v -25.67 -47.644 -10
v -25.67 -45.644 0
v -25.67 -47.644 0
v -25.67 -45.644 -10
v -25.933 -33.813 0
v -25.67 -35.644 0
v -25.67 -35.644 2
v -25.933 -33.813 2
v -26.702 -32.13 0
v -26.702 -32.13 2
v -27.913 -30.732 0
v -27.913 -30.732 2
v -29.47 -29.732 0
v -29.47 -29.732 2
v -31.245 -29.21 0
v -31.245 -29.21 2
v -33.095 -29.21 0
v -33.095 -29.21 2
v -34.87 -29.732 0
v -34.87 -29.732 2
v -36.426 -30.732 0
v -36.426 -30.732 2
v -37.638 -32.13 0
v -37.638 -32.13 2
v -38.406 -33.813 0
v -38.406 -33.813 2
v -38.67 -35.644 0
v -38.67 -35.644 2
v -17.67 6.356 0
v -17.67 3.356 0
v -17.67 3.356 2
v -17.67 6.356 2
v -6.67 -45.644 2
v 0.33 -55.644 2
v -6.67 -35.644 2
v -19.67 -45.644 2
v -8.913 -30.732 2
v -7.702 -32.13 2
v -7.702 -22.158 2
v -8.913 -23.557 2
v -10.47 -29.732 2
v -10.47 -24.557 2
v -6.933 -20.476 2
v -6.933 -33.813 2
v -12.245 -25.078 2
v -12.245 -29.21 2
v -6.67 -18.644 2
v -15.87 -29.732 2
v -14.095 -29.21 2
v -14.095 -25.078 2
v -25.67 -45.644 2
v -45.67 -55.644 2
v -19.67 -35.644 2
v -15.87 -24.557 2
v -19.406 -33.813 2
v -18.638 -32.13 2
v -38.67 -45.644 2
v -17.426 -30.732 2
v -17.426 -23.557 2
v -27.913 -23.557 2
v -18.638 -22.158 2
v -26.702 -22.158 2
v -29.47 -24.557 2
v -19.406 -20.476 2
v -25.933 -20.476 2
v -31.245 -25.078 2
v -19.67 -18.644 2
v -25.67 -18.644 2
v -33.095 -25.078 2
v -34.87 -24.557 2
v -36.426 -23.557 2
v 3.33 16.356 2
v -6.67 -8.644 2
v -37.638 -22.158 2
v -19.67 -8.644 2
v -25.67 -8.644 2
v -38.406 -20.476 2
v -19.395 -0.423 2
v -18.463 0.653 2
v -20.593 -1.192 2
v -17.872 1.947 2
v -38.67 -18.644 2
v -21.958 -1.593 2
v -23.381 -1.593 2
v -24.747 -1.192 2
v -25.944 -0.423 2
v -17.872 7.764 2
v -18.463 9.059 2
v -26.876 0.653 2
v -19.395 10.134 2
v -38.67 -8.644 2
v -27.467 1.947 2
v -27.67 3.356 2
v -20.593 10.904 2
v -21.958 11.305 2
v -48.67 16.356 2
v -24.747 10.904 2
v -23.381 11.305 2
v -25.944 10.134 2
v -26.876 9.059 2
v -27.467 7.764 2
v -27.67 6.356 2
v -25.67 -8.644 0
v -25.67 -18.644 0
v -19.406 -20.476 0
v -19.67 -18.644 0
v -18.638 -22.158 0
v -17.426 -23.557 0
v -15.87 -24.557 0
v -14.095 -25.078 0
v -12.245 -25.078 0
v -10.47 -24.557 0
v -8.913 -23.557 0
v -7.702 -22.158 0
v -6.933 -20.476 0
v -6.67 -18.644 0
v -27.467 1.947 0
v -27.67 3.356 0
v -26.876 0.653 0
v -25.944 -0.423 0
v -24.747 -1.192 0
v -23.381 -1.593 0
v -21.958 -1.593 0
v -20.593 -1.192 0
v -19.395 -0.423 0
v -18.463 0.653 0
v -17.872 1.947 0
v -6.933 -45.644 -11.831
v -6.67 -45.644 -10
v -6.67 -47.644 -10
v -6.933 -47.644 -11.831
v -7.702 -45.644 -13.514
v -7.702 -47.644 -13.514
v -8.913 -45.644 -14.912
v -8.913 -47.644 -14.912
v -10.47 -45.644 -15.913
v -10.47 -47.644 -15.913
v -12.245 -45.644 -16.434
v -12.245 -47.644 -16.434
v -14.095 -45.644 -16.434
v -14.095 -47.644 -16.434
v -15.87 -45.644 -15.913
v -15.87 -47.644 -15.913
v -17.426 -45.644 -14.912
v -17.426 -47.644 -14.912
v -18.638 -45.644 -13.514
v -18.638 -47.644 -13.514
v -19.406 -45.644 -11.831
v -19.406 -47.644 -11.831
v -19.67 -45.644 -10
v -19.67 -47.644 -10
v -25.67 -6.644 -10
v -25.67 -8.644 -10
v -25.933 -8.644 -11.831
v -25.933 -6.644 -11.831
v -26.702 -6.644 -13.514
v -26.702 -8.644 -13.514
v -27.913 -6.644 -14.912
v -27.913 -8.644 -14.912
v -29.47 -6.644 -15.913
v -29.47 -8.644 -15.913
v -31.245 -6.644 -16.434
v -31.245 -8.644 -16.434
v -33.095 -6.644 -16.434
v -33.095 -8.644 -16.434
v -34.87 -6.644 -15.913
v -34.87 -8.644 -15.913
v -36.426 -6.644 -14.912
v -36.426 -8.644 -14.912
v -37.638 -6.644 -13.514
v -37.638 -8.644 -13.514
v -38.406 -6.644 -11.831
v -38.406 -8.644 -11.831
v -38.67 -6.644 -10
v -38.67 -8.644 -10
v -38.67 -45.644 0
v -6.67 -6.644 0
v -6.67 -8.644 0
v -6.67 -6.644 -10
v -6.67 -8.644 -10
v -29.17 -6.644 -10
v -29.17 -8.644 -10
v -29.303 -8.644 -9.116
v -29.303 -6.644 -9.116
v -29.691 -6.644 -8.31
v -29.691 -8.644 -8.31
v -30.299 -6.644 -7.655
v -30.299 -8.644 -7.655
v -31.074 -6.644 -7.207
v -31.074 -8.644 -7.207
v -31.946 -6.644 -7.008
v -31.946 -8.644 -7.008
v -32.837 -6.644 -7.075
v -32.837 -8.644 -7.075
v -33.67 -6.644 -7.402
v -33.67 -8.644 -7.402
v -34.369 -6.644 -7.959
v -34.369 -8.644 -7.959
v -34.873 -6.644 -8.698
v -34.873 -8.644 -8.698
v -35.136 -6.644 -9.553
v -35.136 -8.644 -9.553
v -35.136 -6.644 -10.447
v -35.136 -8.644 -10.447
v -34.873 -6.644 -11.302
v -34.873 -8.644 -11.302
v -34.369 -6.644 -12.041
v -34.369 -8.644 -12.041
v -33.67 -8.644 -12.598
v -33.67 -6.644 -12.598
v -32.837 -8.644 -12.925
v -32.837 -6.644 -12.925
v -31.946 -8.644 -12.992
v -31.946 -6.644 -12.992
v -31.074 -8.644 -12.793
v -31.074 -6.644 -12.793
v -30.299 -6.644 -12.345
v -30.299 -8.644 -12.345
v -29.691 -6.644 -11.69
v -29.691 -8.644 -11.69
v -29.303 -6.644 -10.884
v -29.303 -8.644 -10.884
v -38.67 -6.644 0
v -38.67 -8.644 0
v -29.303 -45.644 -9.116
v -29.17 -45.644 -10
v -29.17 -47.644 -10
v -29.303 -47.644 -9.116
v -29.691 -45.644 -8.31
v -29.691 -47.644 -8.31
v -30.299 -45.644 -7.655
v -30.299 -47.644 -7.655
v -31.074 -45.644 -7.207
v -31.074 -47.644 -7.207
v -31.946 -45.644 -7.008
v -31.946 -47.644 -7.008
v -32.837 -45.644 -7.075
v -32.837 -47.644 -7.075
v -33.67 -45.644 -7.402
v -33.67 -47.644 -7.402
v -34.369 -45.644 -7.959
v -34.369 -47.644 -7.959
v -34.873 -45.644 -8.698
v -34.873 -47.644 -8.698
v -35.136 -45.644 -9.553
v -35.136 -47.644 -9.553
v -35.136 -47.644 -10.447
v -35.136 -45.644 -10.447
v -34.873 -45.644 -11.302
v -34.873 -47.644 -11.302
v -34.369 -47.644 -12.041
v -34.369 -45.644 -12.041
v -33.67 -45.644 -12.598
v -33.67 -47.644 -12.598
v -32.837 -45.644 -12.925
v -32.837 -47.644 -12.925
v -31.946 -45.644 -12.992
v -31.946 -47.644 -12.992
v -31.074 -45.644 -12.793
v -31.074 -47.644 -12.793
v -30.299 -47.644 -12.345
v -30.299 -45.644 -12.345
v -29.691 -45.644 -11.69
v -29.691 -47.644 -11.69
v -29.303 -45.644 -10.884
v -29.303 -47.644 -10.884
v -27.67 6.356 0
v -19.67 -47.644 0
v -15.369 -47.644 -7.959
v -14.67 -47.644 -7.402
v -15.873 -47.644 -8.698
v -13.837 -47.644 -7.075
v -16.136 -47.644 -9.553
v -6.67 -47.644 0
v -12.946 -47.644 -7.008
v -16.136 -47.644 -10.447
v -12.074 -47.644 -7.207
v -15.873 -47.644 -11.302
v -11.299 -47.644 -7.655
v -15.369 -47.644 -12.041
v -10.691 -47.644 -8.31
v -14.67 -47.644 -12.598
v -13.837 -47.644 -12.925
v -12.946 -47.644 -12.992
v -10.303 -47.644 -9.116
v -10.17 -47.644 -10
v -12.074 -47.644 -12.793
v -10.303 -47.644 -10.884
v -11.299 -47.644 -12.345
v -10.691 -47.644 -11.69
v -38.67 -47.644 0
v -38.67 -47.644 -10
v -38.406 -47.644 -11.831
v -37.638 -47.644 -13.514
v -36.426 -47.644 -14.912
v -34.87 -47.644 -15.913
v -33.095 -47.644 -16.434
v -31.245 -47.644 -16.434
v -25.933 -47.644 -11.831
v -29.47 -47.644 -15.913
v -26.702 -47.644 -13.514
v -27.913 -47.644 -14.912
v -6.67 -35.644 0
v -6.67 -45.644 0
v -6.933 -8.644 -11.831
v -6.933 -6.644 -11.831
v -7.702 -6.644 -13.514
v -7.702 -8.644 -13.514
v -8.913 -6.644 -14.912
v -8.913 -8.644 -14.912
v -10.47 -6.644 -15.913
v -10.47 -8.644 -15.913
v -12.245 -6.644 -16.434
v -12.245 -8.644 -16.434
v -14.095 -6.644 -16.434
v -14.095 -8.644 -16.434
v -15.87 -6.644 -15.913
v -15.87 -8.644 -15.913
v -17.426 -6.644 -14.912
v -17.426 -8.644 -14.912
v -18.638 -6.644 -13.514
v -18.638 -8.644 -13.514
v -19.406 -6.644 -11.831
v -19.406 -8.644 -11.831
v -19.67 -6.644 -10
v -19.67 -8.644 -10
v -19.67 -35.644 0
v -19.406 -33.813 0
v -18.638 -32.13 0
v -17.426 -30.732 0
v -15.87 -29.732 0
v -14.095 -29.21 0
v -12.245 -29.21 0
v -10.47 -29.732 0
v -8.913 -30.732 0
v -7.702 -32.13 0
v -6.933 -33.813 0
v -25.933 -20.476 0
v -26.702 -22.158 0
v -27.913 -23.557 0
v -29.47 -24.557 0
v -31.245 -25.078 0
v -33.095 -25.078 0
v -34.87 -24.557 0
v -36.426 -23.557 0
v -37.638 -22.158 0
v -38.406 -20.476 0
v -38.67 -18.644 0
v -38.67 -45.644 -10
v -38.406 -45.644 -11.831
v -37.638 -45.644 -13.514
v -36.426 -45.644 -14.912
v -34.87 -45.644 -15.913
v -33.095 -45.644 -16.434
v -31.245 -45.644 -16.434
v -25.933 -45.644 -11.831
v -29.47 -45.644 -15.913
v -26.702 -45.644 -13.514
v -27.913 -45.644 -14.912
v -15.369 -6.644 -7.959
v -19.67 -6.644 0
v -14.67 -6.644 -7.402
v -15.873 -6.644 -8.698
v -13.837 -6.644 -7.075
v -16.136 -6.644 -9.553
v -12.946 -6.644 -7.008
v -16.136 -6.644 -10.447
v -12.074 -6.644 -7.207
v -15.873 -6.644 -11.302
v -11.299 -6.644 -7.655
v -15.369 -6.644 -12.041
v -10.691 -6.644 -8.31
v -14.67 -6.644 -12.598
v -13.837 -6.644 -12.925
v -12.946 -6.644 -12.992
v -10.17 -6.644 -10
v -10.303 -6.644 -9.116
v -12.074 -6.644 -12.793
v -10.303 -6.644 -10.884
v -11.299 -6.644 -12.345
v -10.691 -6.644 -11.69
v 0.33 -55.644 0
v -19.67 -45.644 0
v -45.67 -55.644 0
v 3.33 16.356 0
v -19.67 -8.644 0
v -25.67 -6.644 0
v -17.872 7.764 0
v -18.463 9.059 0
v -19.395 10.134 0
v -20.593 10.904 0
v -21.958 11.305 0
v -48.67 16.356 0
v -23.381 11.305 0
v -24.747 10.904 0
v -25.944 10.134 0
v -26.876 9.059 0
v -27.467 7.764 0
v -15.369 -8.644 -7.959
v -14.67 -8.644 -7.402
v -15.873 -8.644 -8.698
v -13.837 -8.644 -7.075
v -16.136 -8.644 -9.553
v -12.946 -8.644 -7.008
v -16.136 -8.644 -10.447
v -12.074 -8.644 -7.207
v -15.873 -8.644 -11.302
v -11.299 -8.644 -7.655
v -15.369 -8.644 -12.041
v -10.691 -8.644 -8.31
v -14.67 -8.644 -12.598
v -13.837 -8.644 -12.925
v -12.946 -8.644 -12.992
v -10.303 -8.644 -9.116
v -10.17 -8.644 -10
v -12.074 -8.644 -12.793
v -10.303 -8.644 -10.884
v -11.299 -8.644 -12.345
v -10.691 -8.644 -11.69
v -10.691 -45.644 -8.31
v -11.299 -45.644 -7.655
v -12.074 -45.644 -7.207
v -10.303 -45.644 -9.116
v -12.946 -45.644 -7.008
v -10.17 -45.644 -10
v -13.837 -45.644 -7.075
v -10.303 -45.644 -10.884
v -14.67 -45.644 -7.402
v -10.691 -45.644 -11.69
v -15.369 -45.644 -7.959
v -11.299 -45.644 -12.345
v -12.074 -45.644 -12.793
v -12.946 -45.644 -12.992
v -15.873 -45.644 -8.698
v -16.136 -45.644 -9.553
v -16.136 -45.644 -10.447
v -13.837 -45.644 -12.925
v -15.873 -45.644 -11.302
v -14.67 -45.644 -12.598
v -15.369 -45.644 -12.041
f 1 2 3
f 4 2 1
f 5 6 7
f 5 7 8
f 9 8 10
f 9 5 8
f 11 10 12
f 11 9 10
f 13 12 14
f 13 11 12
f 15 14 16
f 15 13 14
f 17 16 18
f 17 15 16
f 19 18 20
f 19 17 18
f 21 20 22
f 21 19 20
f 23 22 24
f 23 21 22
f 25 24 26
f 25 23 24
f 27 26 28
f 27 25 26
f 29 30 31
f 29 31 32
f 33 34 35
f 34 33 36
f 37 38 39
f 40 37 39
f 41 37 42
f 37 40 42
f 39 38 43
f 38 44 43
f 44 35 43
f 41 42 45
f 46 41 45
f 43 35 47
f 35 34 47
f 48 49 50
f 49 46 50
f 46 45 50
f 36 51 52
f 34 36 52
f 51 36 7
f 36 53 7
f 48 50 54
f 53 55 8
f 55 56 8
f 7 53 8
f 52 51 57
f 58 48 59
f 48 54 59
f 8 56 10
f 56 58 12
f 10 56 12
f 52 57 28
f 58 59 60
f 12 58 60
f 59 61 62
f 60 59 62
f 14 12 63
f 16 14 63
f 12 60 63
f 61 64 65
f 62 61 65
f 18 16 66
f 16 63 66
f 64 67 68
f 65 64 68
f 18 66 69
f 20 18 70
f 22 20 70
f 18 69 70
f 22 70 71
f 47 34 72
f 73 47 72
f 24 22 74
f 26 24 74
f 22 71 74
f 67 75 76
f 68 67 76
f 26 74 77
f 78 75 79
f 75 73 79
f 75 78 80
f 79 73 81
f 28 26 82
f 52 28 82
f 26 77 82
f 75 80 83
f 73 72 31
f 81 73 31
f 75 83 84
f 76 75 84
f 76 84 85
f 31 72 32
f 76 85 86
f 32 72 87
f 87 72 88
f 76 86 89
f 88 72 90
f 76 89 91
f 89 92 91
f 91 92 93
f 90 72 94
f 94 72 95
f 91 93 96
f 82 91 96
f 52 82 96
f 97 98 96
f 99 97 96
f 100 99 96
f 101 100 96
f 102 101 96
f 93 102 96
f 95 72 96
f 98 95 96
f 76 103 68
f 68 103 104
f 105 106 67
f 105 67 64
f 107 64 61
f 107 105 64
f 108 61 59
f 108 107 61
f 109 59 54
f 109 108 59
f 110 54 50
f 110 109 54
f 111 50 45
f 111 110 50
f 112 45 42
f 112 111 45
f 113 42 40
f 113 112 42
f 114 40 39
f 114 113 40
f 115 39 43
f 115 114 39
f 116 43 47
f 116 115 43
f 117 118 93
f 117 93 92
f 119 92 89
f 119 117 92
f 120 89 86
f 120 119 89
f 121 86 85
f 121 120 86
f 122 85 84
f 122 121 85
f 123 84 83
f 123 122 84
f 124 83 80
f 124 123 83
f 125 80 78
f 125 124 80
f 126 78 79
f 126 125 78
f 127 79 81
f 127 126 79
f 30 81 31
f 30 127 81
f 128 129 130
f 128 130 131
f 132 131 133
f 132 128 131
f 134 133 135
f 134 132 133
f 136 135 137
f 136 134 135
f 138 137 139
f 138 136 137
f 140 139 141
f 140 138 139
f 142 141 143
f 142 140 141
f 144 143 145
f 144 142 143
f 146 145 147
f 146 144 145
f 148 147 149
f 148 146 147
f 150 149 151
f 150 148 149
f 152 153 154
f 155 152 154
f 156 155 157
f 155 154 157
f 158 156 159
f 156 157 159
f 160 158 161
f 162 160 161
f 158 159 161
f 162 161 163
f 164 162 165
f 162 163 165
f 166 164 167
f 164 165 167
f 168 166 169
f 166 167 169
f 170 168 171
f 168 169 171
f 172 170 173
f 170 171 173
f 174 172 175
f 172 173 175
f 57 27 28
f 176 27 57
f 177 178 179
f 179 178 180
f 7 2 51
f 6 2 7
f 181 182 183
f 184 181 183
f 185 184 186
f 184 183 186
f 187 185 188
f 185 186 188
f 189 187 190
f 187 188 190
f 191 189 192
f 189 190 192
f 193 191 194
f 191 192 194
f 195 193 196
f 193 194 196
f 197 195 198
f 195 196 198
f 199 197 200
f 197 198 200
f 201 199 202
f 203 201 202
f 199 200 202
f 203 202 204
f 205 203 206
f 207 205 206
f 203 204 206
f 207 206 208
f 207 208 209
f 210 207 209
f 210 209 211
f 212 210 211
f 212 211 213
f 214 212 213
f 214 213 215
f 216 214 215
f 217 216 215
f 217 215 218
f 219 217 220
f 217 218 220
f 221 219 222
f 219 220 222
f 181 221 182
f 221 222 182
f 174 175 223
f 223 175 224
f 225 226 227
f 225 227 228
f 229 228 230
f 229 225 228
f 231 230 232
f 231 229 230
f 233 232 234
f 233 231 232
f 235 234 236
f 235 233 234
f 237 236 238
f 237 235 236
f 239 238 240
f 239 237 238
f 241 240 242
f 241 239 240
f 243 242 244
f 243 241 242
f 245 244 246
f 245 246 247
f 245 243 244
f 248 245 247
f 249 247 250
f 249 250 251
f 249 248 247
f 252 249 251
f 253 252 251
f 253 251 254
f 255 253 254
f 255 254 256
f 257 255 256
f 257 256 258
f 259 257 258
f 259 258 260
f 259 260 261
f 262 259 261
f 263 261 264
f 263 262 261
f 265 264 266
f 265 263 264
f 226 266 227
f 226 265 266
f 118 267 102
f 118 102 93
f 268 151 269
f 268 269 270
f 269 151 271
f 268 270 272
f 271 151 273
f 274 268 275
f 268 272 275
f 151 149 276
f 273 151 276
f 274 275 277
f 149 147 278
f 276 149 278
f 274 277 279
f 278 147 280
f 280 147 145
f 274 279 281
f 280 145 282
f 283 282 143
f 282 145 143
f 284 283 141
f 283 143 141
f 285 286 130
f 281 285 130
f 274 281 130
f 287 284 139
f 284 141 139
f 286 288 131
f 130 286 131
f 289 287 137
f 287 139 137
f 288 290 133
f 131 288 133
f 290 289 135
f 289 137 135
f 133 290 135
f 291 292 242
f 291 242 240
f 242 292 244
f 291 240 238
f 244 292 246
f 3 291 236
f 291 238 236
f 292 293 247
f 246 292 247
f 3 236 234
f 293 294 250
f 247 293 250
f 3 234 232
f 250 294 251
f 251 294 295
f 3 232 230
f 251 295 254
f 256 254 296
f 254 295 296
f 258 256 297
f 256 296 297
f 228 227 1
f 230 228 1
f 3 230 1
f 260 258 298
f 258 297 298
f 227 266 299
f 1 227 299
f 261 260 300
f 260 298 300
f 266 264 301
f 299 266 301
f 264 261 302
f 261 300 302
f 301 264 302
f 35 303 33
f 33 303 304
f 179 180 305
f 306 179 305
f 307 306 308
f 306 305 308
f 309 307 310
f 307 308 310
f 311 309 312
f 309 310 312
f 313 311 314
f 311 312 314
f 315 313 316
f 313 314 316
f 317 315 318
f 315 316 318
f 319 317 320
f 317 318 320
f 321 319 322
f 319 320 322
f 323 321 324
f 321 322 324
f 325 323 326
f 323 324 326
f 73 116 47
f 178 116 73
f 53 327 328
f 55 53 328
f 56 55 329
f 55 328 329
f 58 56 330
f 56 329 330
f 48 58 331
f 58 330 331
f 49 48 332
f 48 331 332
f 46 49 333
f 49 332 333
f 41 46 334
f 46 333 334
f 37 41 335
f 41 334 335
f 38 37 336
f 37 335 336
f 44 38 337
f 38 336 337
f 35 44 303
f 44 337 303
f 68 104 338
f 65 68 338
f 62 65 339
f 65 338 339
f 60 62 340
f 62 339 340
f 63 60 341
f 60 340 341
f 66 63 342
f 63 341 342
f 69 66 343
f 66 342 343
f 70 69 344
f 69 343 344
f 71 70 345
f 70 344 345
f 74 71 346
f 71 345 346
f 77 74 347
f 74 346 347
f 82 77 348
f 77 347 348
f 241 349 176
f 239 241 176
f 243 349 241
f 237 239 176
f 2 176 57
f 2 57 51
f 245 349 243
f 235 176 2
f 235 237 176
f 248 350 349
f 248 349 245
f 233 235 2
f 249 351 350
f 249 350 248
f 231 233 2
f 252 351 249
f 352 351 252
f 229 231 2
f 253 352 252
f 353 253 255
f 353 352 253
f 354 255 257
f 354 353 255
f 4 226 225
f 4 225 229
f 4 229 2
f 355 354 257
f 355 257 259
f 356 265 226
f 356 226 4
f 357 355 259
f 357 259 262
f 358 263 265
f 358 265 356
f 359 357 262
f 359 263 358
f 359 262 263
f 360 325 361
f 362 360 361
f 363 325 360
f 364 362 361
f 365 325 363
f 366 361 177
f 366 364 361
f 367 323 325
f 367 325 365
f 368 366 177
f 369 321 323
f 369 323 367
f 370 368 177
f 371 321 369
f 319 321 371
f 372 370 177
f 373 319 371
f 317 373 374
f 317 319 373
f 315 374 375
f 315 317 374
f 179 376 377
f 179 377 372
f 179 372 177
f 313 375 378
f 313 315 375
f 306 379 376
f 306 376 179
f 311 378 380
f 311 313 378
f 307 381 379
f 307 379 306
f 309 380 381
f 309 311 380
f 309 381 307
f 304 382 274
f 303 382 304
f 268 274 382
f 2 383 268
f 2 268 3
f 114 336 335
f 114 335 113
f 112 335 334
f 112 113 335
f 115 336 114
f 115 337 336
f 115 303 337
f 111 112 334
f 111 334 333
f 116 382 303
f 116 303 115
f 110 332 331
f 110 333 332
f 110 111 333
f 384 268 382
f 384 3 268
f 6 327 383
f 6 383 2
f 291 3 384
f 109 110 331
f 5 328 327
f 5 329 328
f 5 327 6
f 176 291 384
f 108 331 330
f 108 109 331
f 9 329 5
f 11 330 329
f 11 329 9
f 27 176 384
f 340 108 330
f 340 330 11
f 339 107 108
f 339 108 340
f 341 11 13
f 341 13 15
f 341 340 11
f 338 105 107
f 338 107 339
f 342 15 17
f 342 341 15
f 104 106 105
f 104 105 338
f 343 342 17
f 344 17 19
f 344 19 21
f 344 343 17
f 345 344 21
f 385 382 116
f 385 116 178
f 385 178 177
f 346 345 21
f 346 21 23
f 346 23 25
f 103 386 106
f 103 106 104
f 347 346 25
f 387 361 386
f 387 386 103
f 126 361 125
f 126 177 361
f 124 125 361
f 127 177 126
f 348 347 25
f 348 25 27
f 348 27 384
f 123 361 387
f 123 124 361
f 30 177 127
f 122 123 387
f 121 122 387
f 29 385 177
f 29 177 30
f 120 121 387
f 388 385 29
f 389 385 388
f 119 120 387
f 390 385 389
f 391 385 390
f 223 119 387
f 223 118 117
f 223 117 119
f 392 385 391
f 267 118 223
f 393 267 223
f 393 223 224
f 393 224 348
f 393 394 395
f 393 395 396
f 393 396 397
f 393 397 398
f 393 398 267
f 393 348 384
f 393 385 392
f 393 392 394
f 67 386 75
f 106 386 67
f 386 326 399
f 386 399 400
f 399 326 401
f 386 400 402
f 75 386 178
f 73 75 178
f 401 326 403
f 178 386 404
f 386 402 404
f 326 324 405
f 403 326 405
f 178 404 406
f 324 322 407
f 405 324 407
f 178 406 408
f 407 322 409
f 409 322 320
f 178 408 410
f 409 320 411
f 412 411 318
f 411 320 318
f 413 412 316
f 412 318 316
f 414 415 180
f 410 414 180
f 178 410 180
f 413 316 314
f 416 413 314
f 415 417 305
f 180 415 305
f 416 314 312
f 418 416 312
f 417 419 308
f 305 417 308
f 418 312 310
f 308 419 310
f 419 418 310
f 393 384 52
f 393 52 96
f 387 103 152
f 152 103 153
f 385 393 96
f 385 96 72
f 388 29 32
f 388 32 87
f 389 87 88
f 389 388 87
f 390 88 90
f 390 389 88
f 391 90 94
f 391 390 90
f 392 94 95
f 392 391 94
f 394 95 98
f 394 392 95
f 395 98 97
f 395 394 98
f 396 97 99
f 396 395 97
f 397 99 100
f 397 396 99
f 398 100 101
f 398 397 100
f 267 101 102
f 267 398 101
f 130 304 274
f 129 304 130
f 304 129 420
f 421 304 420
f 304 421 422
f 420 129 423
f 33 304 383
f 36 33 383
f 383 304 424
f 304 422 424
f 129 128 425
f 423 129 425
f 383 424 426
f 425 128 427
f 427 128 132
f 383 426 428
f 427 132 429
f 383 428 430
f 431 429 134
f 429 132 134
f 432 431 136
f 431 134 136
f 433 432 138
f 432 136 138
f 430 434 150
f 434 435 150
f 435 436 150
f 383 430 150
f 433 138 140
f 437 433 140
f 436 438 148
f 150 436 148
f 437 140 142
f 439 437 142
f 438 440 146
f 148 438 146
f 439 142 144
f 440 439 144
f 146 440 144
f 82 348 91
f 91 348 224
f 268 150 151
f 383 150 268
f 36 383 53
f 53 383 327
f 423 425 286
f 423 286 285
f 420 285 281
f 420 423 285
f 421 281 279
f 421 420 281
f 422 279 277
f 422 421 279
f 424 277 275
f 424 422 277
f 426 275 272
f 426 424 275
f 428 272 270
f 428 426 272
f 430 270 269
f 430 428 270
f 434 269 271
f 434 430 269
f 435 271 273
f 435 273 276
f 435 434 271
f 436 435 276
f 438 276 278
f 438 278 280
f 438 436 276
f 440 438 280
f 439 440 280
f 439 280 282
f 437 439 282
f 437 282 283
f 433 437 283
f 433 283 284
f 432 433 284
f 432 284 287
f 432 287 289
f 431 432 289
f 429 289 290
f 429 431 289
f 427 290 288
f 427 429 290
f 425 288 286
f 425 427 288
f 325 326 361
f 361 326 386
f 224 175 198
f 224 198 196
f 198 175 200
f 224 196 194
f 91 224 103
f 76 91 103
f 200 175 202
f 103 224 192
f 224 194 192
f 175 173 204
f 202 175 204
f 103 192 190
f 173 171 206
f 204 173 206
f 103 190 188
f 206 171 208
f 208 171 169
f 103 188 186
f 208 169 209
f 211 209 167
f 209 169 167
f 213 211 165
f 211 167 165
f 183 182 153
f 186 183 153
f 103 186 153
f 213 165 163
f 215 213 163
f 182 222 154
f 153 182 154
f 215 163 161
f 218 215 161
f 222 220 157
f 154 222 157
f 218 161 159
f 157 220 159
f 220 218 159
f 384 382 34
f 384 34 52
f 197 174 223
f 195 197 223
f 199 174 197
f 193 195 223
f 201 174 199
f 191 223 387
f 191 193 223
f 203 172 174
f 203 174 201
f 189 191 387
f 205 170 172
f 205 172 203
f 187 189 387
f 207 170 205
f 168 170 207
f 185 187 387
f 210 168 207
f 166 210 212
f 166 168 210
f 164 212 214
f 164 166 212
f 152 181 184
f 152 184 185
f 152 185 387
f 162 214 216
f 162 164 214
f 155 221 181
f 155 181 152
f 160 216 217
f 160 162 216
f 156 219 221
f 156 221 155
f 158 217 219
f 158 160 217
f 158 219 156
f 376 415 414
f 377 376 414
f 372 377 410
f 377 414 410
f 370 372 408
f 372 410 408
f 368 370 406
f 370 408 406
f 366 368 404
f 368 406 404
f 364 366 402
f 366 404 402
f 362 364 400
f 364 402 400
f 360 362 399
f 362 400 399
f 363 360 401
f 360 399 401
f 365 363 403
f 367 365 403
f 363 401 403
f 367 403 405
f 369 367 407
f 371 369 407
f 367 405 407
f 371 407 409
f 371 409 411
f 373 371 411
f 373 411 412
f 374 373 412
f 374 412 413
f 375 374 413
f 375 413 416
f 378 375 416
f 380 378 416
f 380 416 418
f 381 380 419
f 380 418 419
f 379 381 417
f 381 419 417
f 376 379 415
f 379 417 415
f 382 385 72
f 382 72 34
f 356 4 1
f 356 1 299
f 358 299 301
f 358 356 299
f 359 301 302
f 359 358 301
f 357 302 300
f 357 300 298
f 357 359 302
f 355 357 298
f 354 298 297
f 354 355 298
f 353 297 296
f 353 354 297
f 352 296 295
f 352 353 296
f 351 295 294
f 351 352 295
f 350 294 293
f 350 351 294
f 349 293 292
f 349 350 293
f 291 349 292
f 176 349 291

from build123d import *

# Parameters (mm, degrees)
EXTRUDE_1_DEPTH = 2
SKETCH_2_R      = 3
EXTRUDE_2_DEPTH = 2


with BuildPart() as part:
    # 草图1 → 凸台-拉伸1 (new body)
    with BuildSketch(Plane.XY):
        Polygon((-45.669718709, -55.644277912), (-48.669718709, 16.355722088), (3.330281291, 16.355722088), (0.330281291, -55.644277912), align=None)
        with BuildLine():
            ThreePointArc((-25.669718709, -35.644277912), (-32.169718709, -29.144277912), (-38.669718709, -35.644277912))
            Line((-38.669718709, -35.644277912), (-38.669718709, -45.644277912))
            Line((-38.669718709, -45.644277912), (-25.669718709, -45.644277912))
            Line((-25.669718709, -45.644277912), (-25.669718709, -35.644277912))
        make_face(mode=Mode.SUBTRACT)
        with BuildLine():
            ThreePointArc((-19.669718709, -18.644277912), (-13.169718709, -25.144277912), (-6.669718709, -18.644277912))
            Line((-6.669718709, -18.644277912), (-6.669718709, -8.644277912))
            Line((-6.669718709, -8.644277912), (-19.669718709, -8.644277912))
            Line((-19.669718709, -8.644277912), (-19.669718709, -18.644277912))
        make_face(mode=Mode.SUBTRACT)
        with BuildLine():
            ThreePointArc((-17.669718709, 6.355722088), (-22.669718709, 11.355722088), (-27.669718709, 6.355722088))
            Line((-27.669718709, 6.355722088), (-27.669718709, 3.355722088))
            ThreePointArc((-27.669718709, 3.355722088), (-22.669718709, -1.644277912), (-17.669718709, 3.355722088))
            Line((-17.669718709, 3.355722088), (-17.669718709, 6.355722088))
        make_face(mode=Mode.SUBTRACT)
        with BuildLine():
            Line((-25.669718709, -8.644277912), (-25.669718709, -18.644277912))
            ThreePointArc((-25.669718709, -18.644277912), (-32.169718709, -25.144277912), (-38.669718709, -18.644277912))
            Line((-38.669718709, -18.644277912), (-38.669718709, -8.644277912))
            Line((-38.669718709, -8.644277912), (-25.669718709, -8.644277912))
        make_face(mode=Mode.SUBTRACT)
        with BuildLine():
            Line((-19.669718709, -45.644277912), (-19.669718709, -35.644277912))
            ThreePointArc((-19.669718709, -35.644277912), (-13.169718709, -29.144277912), (-6.669718709, -35.644277912))
            Line((-6.669718709, -35.644277912), (-6.669718709, -45.644277912))
            Line((-6.669718709, -45.644277912), (-19.669718709, -45.644277912))
        make_face(mode=Mode.SUBTRACT)
    extrude(amount=EXTRUDE_1_DEPTH)

    # 草图2 → 凸台-拉伸2 (add)
    # profile 1 of 2: a face of its own
    with BuildSketch(Plane(origin=(0, -8.644277912, 0), x_dir=(-1, 0, 0), z_dir=(0, -1, 0))):
        with BuildLine():
            ThreePointArc((25.669718709, 10), (32.169718709, 16.5), (38.669718709, 10))
            Line((38.669718709, 10), (38.669718709, 0))
            Line((38.669718709, 0), (25.669718709, 0))
            Line((25.669718709, 0), (25.669718709, 10))
        make_face()
        with Locations(Location((32.169718709, 10, 0), (0, 0, 180))):
            Circle(SKETCH_2_R, mode=Mode.SUBTRACT)
    # profile 2 of 2: a face of its own
    with BuildSketch(Plane(origin=(0, -8.644277912, 0), x_dir=(-1, 0, 0), z_dir=(0, -1, 0))):
        with BuildLine():
            ThreePointArc((6.669718709, 10), (13.169718709, 16.5), (19.669718709, 10))
            Line((19.669718709, 10), (19.669718709, 0))
            Line((19.669718709, 0), (6.669718709, 0))
            Line((6.669718709, 0), (6.669718709, 10))
        make_face()
        with Locations(Location((13.169718709, 10, 0), (0, 0, 180))):
            Circle(SKETCH_2_R, mode=Mode.SUBTRACT)
    extrude_2 = extrude(amount=-EXTRUDE_2_DEPTH)

    # 镜向2: 凸台-拉伸2 across plane
    add(extrude_2.mirror(Plane(origin=(0, -27.144277912, 0), x_dir=(0, 0, 1), z_dir=(0, -1, 0))))


solid = part.part
